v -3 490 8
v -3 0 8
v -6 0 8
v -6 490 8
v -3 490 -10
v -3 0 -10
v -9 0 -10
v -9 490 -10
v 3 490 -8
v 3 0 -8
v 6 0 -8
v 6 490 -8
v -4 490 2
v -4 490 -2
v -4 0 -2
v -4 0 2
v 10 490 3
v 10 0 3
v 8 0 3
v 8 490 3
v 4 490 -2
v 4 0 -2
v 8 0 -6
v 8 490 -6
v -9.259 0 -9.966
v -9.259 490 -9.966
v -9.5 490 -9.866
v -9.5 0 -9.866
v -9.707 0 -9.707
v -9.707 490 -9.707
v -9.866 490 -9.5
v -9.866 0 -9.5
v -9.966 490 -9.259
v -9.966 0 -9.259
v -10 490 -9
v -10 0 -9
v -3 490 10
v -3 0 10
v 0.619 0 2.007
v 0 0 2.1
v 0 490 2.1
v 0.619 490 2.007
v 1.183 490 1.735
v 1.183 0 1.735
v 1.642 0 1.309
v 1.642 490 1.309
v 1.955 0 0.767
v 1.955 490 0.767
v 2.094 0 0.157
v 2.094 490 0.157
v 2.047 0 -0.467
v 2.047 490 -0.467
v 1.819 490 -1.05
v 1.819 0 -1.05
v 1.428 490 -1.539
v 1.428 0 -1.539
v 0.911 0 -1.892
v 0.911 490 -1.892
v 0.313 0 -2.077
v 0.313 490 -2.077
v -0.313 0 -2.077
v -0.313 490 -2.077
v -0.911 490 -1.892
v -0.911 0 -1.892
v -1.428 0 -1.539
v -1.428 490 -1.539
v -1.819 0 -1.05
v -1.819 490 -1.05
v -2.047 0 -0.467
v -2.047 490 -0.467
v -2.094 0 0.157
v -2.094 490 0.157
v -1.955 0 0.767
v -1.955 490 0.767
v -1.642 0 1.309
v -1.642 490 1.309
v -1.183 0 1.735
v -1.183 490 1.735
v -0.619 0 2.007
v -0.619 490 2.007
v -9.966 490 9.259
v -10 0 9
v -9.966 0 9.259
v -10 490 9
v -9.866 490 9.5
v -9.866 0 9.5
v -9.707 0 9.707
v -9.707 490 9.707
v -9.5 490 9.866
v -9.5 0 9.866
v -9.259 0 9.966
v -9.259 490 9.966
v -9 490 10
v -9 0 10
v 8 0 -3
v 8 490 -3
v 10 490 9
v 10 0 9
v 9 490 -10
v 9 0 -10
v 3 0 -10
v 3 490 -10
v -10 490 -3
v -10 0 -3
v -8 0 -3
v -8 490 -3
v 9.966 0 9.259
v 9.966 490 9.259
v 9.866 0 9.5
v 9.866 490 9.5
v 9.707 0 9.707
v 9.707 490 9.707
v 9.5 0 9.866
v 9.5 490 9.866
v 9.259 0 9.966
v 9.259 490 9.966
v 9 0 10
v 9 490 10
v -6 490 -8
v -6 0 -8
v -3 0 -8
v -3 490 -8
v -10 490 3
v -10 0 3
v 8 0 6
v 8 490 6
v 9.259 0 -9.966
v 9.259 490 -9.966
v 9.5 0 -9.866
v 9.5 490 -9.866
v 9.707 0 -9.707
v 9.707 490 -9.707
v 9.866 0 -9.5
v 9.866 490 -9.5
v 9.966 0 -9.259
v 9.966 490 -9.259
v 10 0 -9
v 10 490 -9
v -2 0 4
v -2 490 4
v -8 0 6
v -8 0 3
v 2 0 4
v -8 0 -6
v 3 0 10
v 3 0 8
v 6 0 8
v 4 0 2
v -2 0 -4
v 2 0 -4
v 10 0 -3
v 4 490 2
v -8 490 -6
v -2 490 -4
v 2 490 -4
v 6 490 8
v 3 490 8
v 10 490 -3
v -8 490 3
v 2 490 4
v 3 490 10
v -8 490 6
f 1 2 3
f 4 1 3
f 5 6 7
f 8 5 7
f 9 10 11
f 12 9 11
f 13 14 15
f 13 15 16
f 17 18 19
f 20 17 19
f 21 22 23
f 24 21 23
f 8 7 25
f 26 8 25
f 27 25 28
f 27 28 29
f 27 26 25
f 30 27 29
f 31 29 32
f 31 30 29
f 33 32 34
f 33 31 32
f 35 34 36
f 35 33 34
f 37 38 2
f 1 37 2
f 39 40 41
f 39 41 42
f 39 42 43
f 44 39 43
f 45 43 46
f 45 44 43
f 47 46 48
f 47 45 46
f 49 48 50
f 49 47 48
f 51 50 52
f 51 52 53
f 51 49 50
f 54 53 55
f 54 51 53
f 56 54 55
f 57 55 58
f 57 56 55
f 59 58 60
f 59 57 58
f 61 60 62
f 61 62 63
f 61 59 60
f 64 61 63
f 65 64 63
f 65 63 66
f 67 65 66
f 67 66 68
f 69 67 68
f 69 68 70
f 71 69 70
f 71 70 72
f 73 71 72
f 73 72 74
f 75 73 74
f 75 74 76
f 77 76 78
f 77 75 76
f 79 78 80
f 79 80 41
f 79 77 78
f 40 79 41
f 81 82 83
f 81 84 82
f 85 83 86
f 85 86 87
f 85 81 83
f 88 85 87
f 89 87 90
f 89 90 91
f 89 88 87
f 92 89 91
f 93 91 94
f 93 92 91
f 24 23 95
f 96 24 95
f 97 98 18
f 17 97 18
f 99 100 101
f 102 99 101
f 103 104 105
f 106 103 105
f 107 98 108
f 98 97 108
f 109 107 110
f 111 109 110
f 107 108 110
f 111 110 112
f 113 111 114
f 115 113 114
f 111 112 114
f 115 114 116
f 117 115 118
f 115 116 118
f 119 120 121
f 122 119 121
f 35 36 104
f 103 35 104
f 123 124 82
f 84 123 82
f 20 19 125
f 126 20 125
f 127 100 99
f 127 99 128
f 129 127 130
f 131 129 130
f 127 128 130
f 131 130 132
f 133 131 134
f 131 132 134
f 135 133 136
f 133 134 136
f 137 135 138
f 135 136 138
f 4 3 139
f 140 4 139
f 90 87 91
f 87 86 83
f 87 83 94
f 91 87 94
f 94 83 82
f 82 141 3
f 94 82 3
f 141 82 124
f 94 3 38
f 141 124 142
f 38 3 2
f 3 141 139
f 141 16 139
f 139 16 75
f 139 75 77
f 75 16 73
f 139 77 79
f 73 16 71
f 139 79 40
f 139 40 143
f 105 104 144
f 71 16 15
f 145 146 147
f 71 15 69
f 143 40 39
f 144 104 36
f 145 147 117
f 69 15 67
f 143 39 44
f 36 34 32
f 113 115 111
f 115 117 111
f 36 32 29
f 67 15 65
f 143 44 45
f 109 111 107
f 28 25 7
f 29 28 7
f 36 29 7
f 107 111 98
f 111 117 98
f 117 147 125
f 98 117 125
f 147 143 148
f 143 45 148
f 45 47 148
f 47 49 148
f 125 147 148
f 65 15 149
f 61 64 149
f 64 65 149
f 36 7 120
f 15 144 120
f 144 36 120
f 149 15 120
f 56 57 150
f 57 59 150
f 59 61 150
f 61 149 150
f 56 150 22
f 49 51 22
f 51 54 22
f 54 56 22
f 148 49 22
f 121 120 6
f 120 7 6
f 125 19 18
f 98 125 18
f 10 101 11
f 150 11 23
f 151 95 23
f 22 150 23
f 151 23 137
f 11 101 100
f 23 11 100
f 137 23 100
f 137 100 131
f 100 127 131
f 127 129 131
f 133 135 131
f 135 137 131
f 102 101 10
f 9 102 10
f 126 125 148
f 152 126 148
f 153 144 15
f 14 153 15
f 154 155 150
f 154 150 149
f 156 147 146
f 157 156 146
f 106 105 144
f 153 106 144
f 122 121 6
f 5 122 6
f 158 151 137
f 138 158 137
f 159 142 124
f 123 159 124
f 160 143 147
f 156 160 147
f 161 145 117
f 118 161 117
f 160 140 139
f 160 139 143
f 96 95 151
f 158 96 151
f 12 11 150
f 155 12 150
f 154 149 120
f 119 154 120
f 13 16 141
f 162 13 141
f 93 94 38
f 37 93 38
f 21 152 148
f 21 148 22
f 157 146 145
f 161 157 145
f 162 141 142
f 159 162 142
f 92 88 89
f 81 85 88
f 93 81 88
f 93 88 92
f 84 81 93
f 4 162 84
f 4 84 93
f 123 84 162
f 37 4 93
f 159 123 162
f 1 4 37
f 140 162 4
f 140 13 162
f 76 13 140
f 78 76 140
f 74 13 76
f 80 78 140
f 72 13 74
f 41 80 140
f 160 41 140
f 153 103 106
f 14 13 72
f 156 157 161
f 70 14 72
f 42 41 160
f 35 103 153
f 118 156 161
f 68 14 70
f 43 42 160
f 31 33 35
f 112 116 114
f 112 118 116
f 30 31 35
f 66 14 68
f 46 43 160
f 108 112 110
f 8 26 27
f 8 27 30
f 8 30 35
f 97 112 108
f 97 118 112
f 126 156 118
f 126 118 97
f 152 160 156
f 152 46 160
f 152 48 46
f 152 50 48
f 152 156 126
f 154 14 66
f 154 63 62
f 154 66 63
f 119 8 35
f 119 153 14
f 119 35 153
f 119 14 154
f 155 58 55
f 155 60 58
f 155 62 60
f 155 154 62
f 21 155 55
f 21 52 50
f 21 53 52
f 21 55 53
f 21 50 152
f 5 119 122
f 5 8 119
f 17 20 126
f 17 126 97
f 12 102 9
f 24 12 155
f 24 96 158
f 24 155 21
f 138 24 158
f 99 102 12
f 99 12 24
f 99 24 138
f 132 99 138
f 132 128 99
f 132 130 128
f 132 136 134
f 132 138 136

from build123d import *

# Parameters (mm, degrees)
SKETCH_1_R      = 2.1
EXTRUDE_1_DEPTH = 490
FILLET_1_R      = 1


with BuildPart() as part:
    # 草图1 → 凸台-拉伸1 (new body)
    with BuildSketch(Plane(origin=(0, 0, 0), x_dir=(1, 0, 0), z_dir=(0, 1, 0))):
        Polygon((10, 10), (3, 10), (3, 8), (6, 8), (2, 4), (-2, 4), (-6, 8), (-3, 8), (-3, 10), (-10, 10), (-10, 3), (-8, 3), (-8, 6), (-4, 2), (-4, -2), (-8, -6), (-8, -3), (-10, -3), (-10, -10), (-3, -10), (-3, -8), (-6, -8), (-2, -4), (2, -4), (6, -8), (3, -8), (3, -10), (10, -10), (10, -3), (8, -3), (8, -6), (4, -2), (4, 2), (8, 6), (8, 3), (10, 3), align=None)
        with Locations(Location((0, 0, 0), (0, 0, 270))):
            Circle(SKETCH_1_R, mode=Mode.SUBTRACT)
    extrude(amount=EXTRUDE_1_DEPTH)

    # 圆角1
    fillet_1_edges = [part.edges().sort_by_distance(p)[0] for p in [
        (10, 245, 10),
        (-10, 245, 10),
        (-10, 245, -10),
        (10, 245, -10),
    ]]
    fillet(fillet_1_edges, radius=FILLET_1_R)


solid = part.part
